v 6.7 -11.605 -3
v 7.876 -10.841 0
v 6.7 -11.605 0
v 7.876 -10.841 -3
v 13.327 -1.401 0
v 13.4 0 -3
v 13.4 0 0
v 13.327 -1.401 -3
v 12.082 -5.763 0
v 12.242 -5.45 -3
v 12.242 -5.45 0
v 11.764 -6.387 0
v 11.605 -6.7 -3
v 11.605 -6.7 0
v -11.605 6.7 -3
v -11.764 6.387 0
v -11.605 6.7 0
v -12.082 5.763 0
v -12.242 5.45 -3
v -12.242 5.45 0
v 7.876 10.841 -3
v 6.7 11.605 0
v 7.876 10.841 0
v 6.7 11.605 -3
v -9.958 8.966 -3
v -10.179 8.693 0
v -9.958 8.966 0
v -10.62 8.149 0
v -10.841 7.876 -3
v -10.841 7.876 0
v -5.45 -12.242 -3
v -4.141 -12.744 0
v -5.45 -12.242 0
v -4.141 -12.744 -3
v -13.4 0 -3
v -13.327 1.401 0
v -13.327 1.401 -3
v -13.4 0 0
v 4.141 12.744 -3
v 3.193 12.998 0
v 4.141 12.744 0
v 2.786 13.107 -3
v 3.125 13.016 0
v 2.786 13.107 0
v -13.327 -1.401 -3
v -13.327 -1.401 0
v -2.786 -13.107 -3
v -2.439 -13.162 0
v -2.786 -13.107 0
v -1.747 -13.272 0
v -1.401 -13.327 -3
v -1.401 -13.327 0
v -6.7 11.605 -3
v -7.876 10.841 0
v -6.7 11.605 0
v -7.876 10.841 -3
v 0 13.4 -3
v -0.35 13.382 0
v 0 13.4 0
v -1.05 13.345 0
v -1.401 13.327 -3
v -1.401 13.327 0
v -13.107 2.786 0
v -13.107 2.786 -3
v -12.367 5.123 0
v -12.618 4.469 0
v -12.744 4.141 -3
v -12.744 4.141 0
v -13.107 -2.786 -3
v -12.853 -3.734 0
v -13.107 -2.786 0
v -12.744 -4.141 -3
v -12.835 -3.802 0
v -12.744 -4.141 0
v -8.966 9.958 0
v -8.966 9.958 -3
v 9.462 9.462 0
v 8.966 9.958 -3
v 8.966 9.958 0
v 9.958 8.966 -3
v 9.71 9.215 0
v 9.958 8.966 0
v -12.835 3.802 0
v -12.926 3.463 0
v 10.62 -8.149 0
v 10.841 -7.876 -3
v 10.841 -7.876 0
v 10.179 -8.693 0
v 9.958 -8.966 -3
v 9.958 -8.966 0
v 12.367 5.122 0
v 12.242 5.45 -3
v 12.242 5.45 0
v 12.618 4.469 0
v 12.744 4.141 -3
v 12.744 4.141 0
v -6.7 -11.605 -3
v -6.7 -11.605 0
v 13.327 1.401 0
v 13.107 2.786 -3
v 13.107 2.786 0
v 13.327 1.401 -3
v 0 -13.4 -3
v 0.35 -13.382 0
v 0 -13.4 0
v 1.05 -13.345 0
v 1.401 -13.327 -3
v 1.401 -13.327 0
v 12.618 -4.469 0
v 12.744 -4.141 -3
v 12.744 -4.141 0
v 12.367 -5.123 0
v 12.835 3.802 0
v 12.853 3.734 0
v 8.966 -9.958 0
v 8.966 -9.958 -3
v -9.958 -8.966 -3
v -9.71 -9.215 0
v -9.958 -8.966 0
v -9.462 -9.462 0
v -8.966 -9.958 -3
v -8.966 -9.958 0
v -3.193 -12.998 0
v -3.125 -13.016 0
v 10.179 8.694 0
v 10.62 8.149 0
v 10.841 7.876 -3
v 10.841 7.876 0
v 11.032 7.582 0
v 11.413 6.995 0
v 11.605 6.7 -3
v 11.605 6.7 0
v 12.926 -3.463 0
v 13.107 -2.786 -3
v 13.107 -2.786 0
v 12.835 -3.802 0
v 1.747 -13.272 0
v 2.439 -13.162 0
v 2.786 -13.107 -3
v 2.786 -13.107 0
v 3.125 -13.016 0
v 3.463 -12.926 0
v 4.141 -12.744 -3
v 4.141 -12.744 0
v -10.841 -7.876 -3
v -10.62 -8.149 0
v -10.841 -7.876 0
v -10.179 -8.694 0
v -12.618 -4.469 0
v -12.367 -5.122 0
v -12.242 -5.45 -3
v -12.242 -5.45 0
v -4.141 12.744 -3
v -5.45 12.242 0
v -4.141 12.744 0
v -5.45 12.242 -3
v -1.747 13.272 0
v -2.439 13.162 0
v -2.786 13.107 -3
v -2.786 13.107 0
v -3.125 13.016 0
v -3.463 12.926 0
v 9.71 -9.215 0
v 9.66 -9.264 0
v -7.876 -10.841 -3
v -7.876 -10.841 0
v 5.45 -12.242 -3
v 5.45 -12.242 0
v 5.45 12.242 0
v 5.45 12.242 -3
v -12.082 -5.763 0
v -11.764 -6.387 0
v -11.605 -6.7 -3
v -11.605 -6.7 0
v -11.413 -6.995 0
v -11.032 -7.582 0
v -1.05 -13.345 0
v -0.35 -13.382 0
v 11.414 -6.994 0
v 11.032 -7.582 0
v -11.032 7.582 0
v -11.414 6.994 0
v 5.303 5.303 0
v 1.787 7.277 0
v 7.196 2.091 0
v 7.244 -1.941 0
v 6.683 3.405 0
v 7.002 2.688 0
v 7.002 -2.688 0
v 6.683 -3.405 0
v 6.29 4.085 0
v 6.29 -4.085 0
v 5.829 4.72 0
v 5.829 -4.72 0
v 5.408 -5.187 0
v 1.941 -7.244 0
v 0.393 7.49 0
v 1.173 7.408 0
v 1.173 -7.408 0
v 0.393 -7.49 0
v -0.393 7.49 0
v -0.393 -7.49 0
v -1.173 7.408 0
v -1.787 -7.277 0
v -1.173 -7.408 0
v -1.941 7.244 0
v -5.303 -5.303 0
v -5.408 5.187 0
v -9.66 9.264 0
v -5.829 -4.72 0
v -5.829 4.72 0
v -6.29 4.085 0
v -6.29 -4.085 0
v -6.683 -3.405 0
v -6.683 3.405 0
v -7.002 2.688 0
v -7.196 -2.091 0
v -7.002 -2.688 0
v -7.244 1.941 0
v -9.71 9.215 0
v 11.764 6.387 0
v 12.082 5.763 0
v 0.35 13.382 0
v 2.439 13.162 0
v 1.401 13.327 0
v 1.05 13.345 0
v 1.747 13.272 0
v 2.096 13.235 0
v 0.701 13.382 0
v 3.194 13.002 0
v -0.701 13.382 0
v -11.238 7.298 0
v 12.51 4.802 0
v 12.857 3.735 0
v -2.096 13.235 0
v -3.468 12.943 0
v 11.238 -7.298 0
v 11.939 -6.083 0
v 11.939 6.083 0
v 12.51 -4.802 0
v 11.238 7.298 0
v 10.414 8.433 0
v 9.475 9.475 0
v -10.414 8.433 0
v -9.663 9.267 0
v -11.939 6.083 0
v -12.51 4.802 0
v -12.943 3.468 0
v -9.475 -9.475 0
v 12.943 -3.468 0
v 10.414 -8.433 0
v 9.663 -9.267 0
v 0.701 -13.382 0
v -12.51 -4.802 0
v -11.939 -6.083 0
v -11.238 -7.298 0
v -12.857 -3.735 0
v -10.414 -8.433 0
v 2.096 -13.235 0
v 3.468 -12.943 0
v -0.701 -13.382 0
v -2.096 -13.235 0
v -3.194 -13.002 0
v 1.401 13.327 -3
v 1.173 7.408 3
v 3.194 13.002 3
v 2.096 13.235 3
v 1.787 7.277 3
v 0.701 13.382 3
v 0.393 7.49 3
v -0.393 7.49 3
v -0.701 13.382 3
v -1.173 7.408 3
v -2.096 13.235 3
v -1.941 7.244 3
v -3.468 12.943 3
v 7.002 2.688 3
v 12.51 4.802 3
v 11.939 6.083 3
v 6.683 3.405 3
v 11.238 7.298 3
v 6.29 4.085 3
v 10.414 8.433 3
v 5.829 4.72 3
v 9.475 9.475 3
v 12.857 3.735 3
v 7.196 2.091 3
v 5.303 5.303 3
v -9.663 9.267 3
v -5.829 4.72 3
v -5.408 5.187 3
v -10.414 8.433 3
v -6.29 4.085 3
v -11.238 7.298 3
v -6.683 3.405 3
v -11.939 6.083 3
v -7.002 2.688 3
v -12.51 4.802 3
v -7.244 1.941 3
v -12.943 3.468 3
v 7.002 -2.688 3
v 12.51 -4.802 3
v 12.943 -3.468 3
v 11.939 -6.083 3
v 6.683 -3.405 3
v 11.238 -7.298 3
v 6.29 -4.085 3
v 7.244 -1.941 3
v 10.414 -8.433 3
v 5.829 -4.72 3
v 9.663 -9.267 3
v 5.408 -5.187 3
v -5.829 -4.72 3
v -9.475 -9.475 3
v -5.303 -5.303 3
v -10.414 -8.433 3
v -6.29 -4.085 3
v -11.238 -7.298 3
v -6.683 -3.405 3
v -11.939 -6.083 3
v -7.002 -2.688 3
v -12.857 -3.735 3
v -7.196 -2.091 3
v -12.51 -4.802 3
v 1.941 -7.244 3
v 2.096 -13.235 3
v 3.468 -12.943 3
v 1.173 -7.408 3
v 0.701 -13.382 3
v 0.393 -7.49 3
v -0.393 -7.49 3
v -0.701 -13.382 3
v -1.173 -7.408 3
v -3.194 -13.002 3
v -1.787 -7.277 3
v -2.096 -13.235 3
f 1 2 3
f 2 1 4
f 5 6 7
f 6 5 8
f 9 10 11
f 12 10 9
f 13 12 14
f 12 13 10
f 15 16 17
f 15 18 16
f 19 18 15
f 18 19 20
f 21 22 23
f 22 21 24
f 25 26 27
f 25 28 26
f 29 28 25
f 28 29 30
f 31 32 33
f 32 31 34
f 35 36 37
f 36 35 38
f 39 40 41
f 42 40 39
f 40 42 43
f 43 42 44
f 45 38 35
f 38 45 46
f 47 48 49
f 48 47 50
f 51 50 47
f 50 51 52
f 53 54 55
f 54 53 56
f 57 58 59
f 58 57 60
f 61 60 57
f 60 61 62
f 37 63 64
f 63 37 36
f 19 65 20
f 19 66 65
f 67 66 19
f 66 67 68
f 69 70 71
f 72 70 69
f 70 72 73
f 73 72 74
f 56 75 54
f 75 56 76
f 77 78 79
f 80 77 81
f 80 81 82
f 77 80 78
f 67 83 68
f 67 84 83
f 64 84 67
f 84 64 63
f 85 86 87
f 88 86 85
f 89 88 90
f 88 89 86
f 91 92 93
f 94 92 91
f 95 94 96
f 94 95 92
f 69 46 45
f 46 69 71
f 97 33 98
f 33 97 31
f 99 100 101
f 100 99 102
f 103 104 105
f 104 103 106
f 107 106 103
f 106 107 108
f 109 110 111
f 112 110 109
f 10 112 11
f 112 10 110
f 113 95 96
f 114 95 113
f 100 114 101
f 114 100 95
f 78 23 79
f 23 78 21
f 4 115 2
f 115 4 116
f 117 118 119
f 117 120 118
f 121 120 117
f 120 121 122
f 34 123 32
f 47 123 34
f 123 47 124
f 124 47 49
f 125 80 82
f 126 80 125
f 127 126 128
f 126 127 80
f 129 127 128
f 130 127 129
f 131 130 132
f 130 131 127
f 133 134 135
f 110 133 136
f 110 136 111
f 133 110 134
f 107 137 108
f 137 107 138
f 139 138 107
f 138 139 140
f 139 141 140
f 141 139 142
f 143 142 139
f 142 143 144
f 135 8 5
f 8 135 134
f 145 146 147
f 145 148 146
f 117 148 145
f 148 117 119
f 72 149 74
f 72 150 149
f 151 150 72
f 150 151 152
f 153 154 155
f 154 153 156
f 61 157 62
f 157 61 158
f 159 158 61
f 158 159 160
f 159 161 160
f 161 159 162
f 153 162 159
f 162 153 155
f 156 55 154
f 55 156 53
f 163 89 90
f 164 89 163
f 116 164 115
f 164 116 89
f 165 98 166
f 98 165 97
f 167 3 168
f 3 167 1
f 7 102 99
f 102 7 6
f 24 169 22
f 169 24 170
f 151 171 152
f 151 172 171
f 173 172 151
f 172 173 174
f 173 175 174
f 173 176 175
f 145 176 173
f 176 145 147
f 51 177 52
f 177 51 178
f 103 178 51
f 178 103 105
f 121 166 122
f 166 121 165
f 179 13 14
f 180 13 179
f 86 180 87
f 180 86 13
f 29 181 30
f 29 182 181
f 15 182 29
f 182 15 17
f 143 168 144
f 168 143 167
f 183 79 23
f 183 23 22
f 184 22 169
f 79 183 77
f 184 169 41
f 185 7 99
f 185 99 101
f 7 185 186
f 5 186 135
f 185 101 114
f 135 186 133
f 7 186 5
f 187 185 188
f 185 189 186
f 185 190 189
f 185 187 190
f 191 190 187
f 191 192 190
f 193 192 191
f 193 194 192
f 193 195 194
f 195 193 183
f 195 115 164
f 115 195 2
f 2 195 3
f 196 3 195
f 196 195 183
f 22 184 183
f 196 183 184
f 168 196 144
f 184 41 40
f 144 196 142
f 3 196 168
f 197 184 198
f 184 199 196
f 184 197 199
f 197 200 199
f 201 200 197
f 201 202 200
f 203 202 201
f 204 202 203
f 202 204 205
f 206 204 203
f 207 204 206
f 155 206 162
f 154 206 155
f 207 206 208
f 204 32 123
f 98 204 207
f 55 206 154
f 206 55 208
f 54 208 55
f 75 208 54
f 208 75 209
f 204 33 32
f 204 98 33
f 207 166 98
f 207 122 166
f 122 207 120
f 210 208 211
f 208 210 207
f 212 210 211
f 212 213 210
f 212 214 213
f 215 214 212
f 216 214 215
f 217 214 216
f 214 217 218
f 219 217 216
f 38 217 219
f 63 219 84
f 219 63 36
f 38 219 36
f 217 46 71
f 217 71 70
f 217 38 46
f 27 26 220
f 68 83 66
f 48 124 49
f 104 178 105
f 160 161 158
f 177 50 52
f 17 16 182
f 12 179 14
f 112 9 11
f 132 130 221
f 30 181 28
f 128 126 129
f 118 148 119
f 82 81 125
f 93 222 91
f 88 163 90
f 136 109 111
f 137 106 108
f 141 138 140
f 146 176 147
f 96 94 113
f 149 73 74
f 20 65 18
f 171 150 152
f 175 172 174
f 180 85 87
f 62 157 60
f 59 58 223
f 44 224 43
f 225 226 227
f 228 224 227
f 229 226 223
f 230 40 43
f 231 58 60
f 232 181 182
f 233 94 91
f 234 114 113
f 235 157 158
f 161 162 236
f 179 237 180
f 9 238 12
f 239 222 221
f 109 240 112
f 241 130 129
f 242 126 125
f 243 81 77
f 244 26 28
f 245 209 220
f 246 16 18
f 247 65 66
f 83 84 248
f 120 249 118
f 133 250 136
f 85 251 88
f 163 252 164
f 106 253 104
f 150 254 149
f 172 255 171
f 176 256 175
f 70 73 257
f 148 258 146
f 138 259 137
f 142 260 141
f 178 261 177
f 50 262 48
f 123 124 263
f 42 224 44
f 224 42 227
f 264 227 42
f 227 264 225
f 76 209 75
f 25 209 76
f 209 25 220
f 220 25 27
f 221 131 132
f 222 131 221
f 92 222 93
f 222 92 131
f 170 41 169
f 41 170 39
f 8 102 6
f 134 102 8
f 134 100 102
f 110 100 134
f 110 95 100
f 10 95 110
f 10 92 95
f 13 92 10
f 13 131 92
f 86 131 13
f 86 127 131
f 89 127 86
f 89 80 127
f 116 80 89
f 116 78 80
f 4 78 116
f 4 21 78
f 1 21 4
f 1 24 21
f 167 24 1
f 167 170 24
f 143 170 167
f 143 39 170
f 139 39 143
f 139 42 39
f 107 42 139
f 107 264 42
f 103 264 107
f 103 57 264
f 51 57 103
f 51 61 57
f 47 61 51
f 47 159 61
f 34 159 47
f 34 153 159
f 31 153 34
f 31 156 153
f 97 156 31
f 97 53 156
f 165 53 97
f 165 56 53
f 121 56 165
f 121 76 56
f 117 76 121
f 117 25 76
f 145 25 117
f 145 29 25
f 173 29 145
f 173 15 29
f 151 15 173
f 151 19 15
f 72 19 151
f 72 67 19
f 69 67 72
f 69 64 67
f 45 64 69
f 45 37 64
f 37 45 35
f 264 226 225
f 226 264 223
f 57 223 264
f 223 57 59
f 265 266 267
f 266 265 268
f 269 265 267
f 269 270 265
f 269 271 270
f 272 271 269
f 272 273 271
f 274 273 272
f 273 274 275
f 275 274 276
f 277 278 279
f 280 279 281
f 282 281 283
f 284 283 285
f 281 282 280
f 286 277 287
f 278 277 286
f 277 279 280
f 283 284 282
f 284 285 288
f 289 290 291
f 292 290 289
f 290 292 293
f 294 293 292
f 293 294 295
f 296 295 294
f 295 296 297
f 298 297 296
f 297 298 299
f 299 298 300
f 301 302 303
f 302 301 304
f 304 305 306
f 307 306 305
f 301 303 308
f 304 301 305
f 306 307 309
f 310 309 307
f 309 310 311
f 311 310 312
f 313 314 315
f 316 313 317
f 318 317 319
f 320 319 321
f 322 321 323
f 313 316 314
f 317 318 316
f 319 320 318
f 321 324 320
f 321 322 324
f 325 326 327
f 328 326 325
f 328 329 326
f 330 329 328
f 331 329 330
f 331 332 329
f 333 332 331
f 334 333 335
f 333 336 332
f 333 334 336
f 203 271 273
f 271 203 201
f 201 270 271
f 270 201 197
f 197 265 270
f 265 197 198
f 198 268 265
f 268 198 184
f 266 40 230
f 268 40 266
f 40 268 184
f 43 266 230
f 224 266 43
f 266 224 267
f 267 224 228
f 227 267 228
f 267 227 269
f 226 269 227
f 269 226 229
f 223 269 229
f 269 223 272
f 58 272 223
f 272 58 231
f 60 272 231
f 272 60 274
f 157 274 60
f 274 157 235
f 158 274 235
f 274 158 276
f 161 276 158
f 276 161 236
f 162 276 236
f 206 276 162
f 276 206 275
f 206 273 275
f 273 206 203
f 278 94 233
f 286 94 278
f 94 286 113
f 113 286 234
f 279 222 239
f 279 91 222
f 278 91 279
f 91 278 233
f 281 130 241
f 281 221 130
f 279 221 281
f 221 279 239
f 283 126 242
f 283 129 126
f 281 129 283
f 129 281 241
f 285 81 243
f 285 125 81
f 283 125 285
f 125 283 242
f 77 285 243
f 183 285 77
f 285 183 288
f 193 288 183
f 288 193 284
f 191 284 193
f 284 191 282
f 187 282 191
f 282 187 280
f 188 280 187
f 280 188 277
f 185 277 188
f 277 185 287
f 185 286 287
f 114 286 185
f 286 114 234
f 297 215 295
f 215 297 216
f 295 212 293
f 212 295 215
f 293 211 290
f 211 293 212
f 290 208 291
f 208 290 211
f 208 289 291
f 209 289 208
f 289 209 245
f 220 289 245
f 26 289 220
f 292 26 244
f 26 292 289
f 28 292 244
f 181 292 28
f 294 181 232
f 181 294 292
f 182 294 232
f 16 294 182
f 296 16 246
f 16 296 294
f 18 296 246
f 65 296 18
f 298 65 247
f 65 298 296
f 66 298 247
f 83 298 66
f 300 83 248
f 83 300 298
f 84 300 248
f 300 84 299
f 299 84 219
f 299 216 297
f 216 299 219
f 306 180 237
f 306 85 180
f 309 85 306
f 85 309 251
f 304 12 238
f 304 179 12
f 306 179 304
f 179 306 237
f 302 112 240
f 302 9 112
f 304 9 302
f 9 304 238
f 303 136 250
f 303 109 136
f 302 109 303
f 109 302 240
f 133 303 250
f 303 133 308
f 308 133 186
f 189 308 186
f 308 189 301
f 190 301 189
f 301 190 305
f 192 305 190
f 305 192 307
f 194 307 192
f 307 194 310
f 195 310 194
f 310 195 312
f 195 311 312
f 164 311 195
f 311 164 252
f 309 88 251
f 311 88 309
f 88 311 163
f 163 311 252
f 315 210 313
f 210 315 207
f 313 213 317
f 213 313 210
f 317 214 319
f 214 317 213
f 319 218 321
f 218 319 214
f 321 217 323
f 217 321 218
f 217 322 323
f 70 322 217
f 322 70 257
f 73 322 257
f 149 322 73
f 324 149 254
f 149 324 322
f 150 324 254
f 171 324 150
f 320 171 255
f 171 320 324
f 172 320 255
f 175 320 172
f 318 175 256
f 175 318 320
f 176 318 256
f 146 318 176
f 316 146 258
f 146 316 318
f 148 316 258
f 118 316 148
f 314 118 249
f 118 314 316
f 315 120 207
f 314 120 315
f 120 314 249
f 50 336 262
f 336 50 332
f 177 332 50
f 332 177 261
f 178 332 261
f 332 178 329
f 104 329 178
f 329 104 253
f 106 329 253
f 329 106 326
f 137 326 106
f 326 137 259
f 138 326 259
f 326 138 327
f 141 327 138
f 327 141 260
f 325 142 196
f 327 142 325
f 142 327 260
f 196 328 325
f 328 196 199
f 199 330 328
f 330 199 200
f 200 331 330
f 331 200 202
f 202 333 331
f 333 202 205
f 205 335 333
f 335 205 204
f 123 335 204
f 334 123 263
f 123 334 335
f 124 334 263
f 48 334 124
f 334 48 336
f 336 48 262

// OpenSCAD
// file: peg-plug.scad
/*
Copyright 2017 Trashbots Inc.

Licensed under the Apache License, Version 2.0 (the "License");
you may not use this file except in compliance with the License.
You may obtain a copy of the License at

    http://www.apache.org/licenses/LICENSE-2.0

Unless required by applicable law or agreed to in writing, software
distributed under the License is distributed on an "AS IS" BASIS,
WITHOUT WARRANTIES OR CONDITIONS OF ANY KIND, either express or implied.
See the License for the specific language governing permissions and
limitations under the License.
*/

$fn = 60;

// rotate (-step/4) translate([0,0,-baseHieght]) linear_extrude(baseHieght) circle(d=diameter);

module circlePegs (pegs = 6, diameter = 26.8, innerDiameter = 15, height = 3, fudge = 1.04) {
    step        = 360 / pegs;

    // Additional amount keeps the plug from binding too hard when 
    // pluged into a complimentary part.
    halfStep    = (step / 2) * fudge;
    radius      = (diameter / 2);
    pegHeight   = height;
    
    rotate (-step/4) 
    linear_extrude(height=pegHeight) 
    difference () {
        difference() {
            circle(d=diameter);
            circle(d=innerDiameter);
        }
        for (i = [0:step:360]) {
            // The diameter is used so the triangle is much longer than the edges need
            // but long enough to clear out the entire wedge.
            polygon([
                    [0,0],
                    [diameter * cos(i), diameter * sin(i) ],
                    [diameter * cos(i + (halfStep)), diameter * sin(i+(halfStep)) ]
                    ]);
        }
    }
}


module circlePegsWithBase(pegs = 6, diameter = 26.8, innerDiameter = 15, heigth = 6) {
    baseHieght  = heigth / 2;

    translate([0,0,-baseHieght]) linear_extrude(heigth/2) circle(d=diameter);
    circlePegs(pegs, diameter, innerDiameter, heigth/2);
}


circlePegsWithBase();
// main file
/*
Copyright 2017 Trashbots Inc.

Licensed under the Apache License, Version 2.0 (the "License");
you may not use this file except in compliance with the License.
You may obtain a copy of the License at

    http://www.apache.org/licenses/LICENSE-2.0

Unless required by applicable law or agreed to in writing, software
distributed under the License is distributed on an "AS IS" BASIS,
WITHOUT WARRANTIES OR CONDITIONS OF ANY KIND, either express or implied.
See the License for the specific language governing permissions and
limitations under the License.
*/

use <peg-plug.scad>;

circlePegsWithBase(pegs = 6, diameter=26.8);
